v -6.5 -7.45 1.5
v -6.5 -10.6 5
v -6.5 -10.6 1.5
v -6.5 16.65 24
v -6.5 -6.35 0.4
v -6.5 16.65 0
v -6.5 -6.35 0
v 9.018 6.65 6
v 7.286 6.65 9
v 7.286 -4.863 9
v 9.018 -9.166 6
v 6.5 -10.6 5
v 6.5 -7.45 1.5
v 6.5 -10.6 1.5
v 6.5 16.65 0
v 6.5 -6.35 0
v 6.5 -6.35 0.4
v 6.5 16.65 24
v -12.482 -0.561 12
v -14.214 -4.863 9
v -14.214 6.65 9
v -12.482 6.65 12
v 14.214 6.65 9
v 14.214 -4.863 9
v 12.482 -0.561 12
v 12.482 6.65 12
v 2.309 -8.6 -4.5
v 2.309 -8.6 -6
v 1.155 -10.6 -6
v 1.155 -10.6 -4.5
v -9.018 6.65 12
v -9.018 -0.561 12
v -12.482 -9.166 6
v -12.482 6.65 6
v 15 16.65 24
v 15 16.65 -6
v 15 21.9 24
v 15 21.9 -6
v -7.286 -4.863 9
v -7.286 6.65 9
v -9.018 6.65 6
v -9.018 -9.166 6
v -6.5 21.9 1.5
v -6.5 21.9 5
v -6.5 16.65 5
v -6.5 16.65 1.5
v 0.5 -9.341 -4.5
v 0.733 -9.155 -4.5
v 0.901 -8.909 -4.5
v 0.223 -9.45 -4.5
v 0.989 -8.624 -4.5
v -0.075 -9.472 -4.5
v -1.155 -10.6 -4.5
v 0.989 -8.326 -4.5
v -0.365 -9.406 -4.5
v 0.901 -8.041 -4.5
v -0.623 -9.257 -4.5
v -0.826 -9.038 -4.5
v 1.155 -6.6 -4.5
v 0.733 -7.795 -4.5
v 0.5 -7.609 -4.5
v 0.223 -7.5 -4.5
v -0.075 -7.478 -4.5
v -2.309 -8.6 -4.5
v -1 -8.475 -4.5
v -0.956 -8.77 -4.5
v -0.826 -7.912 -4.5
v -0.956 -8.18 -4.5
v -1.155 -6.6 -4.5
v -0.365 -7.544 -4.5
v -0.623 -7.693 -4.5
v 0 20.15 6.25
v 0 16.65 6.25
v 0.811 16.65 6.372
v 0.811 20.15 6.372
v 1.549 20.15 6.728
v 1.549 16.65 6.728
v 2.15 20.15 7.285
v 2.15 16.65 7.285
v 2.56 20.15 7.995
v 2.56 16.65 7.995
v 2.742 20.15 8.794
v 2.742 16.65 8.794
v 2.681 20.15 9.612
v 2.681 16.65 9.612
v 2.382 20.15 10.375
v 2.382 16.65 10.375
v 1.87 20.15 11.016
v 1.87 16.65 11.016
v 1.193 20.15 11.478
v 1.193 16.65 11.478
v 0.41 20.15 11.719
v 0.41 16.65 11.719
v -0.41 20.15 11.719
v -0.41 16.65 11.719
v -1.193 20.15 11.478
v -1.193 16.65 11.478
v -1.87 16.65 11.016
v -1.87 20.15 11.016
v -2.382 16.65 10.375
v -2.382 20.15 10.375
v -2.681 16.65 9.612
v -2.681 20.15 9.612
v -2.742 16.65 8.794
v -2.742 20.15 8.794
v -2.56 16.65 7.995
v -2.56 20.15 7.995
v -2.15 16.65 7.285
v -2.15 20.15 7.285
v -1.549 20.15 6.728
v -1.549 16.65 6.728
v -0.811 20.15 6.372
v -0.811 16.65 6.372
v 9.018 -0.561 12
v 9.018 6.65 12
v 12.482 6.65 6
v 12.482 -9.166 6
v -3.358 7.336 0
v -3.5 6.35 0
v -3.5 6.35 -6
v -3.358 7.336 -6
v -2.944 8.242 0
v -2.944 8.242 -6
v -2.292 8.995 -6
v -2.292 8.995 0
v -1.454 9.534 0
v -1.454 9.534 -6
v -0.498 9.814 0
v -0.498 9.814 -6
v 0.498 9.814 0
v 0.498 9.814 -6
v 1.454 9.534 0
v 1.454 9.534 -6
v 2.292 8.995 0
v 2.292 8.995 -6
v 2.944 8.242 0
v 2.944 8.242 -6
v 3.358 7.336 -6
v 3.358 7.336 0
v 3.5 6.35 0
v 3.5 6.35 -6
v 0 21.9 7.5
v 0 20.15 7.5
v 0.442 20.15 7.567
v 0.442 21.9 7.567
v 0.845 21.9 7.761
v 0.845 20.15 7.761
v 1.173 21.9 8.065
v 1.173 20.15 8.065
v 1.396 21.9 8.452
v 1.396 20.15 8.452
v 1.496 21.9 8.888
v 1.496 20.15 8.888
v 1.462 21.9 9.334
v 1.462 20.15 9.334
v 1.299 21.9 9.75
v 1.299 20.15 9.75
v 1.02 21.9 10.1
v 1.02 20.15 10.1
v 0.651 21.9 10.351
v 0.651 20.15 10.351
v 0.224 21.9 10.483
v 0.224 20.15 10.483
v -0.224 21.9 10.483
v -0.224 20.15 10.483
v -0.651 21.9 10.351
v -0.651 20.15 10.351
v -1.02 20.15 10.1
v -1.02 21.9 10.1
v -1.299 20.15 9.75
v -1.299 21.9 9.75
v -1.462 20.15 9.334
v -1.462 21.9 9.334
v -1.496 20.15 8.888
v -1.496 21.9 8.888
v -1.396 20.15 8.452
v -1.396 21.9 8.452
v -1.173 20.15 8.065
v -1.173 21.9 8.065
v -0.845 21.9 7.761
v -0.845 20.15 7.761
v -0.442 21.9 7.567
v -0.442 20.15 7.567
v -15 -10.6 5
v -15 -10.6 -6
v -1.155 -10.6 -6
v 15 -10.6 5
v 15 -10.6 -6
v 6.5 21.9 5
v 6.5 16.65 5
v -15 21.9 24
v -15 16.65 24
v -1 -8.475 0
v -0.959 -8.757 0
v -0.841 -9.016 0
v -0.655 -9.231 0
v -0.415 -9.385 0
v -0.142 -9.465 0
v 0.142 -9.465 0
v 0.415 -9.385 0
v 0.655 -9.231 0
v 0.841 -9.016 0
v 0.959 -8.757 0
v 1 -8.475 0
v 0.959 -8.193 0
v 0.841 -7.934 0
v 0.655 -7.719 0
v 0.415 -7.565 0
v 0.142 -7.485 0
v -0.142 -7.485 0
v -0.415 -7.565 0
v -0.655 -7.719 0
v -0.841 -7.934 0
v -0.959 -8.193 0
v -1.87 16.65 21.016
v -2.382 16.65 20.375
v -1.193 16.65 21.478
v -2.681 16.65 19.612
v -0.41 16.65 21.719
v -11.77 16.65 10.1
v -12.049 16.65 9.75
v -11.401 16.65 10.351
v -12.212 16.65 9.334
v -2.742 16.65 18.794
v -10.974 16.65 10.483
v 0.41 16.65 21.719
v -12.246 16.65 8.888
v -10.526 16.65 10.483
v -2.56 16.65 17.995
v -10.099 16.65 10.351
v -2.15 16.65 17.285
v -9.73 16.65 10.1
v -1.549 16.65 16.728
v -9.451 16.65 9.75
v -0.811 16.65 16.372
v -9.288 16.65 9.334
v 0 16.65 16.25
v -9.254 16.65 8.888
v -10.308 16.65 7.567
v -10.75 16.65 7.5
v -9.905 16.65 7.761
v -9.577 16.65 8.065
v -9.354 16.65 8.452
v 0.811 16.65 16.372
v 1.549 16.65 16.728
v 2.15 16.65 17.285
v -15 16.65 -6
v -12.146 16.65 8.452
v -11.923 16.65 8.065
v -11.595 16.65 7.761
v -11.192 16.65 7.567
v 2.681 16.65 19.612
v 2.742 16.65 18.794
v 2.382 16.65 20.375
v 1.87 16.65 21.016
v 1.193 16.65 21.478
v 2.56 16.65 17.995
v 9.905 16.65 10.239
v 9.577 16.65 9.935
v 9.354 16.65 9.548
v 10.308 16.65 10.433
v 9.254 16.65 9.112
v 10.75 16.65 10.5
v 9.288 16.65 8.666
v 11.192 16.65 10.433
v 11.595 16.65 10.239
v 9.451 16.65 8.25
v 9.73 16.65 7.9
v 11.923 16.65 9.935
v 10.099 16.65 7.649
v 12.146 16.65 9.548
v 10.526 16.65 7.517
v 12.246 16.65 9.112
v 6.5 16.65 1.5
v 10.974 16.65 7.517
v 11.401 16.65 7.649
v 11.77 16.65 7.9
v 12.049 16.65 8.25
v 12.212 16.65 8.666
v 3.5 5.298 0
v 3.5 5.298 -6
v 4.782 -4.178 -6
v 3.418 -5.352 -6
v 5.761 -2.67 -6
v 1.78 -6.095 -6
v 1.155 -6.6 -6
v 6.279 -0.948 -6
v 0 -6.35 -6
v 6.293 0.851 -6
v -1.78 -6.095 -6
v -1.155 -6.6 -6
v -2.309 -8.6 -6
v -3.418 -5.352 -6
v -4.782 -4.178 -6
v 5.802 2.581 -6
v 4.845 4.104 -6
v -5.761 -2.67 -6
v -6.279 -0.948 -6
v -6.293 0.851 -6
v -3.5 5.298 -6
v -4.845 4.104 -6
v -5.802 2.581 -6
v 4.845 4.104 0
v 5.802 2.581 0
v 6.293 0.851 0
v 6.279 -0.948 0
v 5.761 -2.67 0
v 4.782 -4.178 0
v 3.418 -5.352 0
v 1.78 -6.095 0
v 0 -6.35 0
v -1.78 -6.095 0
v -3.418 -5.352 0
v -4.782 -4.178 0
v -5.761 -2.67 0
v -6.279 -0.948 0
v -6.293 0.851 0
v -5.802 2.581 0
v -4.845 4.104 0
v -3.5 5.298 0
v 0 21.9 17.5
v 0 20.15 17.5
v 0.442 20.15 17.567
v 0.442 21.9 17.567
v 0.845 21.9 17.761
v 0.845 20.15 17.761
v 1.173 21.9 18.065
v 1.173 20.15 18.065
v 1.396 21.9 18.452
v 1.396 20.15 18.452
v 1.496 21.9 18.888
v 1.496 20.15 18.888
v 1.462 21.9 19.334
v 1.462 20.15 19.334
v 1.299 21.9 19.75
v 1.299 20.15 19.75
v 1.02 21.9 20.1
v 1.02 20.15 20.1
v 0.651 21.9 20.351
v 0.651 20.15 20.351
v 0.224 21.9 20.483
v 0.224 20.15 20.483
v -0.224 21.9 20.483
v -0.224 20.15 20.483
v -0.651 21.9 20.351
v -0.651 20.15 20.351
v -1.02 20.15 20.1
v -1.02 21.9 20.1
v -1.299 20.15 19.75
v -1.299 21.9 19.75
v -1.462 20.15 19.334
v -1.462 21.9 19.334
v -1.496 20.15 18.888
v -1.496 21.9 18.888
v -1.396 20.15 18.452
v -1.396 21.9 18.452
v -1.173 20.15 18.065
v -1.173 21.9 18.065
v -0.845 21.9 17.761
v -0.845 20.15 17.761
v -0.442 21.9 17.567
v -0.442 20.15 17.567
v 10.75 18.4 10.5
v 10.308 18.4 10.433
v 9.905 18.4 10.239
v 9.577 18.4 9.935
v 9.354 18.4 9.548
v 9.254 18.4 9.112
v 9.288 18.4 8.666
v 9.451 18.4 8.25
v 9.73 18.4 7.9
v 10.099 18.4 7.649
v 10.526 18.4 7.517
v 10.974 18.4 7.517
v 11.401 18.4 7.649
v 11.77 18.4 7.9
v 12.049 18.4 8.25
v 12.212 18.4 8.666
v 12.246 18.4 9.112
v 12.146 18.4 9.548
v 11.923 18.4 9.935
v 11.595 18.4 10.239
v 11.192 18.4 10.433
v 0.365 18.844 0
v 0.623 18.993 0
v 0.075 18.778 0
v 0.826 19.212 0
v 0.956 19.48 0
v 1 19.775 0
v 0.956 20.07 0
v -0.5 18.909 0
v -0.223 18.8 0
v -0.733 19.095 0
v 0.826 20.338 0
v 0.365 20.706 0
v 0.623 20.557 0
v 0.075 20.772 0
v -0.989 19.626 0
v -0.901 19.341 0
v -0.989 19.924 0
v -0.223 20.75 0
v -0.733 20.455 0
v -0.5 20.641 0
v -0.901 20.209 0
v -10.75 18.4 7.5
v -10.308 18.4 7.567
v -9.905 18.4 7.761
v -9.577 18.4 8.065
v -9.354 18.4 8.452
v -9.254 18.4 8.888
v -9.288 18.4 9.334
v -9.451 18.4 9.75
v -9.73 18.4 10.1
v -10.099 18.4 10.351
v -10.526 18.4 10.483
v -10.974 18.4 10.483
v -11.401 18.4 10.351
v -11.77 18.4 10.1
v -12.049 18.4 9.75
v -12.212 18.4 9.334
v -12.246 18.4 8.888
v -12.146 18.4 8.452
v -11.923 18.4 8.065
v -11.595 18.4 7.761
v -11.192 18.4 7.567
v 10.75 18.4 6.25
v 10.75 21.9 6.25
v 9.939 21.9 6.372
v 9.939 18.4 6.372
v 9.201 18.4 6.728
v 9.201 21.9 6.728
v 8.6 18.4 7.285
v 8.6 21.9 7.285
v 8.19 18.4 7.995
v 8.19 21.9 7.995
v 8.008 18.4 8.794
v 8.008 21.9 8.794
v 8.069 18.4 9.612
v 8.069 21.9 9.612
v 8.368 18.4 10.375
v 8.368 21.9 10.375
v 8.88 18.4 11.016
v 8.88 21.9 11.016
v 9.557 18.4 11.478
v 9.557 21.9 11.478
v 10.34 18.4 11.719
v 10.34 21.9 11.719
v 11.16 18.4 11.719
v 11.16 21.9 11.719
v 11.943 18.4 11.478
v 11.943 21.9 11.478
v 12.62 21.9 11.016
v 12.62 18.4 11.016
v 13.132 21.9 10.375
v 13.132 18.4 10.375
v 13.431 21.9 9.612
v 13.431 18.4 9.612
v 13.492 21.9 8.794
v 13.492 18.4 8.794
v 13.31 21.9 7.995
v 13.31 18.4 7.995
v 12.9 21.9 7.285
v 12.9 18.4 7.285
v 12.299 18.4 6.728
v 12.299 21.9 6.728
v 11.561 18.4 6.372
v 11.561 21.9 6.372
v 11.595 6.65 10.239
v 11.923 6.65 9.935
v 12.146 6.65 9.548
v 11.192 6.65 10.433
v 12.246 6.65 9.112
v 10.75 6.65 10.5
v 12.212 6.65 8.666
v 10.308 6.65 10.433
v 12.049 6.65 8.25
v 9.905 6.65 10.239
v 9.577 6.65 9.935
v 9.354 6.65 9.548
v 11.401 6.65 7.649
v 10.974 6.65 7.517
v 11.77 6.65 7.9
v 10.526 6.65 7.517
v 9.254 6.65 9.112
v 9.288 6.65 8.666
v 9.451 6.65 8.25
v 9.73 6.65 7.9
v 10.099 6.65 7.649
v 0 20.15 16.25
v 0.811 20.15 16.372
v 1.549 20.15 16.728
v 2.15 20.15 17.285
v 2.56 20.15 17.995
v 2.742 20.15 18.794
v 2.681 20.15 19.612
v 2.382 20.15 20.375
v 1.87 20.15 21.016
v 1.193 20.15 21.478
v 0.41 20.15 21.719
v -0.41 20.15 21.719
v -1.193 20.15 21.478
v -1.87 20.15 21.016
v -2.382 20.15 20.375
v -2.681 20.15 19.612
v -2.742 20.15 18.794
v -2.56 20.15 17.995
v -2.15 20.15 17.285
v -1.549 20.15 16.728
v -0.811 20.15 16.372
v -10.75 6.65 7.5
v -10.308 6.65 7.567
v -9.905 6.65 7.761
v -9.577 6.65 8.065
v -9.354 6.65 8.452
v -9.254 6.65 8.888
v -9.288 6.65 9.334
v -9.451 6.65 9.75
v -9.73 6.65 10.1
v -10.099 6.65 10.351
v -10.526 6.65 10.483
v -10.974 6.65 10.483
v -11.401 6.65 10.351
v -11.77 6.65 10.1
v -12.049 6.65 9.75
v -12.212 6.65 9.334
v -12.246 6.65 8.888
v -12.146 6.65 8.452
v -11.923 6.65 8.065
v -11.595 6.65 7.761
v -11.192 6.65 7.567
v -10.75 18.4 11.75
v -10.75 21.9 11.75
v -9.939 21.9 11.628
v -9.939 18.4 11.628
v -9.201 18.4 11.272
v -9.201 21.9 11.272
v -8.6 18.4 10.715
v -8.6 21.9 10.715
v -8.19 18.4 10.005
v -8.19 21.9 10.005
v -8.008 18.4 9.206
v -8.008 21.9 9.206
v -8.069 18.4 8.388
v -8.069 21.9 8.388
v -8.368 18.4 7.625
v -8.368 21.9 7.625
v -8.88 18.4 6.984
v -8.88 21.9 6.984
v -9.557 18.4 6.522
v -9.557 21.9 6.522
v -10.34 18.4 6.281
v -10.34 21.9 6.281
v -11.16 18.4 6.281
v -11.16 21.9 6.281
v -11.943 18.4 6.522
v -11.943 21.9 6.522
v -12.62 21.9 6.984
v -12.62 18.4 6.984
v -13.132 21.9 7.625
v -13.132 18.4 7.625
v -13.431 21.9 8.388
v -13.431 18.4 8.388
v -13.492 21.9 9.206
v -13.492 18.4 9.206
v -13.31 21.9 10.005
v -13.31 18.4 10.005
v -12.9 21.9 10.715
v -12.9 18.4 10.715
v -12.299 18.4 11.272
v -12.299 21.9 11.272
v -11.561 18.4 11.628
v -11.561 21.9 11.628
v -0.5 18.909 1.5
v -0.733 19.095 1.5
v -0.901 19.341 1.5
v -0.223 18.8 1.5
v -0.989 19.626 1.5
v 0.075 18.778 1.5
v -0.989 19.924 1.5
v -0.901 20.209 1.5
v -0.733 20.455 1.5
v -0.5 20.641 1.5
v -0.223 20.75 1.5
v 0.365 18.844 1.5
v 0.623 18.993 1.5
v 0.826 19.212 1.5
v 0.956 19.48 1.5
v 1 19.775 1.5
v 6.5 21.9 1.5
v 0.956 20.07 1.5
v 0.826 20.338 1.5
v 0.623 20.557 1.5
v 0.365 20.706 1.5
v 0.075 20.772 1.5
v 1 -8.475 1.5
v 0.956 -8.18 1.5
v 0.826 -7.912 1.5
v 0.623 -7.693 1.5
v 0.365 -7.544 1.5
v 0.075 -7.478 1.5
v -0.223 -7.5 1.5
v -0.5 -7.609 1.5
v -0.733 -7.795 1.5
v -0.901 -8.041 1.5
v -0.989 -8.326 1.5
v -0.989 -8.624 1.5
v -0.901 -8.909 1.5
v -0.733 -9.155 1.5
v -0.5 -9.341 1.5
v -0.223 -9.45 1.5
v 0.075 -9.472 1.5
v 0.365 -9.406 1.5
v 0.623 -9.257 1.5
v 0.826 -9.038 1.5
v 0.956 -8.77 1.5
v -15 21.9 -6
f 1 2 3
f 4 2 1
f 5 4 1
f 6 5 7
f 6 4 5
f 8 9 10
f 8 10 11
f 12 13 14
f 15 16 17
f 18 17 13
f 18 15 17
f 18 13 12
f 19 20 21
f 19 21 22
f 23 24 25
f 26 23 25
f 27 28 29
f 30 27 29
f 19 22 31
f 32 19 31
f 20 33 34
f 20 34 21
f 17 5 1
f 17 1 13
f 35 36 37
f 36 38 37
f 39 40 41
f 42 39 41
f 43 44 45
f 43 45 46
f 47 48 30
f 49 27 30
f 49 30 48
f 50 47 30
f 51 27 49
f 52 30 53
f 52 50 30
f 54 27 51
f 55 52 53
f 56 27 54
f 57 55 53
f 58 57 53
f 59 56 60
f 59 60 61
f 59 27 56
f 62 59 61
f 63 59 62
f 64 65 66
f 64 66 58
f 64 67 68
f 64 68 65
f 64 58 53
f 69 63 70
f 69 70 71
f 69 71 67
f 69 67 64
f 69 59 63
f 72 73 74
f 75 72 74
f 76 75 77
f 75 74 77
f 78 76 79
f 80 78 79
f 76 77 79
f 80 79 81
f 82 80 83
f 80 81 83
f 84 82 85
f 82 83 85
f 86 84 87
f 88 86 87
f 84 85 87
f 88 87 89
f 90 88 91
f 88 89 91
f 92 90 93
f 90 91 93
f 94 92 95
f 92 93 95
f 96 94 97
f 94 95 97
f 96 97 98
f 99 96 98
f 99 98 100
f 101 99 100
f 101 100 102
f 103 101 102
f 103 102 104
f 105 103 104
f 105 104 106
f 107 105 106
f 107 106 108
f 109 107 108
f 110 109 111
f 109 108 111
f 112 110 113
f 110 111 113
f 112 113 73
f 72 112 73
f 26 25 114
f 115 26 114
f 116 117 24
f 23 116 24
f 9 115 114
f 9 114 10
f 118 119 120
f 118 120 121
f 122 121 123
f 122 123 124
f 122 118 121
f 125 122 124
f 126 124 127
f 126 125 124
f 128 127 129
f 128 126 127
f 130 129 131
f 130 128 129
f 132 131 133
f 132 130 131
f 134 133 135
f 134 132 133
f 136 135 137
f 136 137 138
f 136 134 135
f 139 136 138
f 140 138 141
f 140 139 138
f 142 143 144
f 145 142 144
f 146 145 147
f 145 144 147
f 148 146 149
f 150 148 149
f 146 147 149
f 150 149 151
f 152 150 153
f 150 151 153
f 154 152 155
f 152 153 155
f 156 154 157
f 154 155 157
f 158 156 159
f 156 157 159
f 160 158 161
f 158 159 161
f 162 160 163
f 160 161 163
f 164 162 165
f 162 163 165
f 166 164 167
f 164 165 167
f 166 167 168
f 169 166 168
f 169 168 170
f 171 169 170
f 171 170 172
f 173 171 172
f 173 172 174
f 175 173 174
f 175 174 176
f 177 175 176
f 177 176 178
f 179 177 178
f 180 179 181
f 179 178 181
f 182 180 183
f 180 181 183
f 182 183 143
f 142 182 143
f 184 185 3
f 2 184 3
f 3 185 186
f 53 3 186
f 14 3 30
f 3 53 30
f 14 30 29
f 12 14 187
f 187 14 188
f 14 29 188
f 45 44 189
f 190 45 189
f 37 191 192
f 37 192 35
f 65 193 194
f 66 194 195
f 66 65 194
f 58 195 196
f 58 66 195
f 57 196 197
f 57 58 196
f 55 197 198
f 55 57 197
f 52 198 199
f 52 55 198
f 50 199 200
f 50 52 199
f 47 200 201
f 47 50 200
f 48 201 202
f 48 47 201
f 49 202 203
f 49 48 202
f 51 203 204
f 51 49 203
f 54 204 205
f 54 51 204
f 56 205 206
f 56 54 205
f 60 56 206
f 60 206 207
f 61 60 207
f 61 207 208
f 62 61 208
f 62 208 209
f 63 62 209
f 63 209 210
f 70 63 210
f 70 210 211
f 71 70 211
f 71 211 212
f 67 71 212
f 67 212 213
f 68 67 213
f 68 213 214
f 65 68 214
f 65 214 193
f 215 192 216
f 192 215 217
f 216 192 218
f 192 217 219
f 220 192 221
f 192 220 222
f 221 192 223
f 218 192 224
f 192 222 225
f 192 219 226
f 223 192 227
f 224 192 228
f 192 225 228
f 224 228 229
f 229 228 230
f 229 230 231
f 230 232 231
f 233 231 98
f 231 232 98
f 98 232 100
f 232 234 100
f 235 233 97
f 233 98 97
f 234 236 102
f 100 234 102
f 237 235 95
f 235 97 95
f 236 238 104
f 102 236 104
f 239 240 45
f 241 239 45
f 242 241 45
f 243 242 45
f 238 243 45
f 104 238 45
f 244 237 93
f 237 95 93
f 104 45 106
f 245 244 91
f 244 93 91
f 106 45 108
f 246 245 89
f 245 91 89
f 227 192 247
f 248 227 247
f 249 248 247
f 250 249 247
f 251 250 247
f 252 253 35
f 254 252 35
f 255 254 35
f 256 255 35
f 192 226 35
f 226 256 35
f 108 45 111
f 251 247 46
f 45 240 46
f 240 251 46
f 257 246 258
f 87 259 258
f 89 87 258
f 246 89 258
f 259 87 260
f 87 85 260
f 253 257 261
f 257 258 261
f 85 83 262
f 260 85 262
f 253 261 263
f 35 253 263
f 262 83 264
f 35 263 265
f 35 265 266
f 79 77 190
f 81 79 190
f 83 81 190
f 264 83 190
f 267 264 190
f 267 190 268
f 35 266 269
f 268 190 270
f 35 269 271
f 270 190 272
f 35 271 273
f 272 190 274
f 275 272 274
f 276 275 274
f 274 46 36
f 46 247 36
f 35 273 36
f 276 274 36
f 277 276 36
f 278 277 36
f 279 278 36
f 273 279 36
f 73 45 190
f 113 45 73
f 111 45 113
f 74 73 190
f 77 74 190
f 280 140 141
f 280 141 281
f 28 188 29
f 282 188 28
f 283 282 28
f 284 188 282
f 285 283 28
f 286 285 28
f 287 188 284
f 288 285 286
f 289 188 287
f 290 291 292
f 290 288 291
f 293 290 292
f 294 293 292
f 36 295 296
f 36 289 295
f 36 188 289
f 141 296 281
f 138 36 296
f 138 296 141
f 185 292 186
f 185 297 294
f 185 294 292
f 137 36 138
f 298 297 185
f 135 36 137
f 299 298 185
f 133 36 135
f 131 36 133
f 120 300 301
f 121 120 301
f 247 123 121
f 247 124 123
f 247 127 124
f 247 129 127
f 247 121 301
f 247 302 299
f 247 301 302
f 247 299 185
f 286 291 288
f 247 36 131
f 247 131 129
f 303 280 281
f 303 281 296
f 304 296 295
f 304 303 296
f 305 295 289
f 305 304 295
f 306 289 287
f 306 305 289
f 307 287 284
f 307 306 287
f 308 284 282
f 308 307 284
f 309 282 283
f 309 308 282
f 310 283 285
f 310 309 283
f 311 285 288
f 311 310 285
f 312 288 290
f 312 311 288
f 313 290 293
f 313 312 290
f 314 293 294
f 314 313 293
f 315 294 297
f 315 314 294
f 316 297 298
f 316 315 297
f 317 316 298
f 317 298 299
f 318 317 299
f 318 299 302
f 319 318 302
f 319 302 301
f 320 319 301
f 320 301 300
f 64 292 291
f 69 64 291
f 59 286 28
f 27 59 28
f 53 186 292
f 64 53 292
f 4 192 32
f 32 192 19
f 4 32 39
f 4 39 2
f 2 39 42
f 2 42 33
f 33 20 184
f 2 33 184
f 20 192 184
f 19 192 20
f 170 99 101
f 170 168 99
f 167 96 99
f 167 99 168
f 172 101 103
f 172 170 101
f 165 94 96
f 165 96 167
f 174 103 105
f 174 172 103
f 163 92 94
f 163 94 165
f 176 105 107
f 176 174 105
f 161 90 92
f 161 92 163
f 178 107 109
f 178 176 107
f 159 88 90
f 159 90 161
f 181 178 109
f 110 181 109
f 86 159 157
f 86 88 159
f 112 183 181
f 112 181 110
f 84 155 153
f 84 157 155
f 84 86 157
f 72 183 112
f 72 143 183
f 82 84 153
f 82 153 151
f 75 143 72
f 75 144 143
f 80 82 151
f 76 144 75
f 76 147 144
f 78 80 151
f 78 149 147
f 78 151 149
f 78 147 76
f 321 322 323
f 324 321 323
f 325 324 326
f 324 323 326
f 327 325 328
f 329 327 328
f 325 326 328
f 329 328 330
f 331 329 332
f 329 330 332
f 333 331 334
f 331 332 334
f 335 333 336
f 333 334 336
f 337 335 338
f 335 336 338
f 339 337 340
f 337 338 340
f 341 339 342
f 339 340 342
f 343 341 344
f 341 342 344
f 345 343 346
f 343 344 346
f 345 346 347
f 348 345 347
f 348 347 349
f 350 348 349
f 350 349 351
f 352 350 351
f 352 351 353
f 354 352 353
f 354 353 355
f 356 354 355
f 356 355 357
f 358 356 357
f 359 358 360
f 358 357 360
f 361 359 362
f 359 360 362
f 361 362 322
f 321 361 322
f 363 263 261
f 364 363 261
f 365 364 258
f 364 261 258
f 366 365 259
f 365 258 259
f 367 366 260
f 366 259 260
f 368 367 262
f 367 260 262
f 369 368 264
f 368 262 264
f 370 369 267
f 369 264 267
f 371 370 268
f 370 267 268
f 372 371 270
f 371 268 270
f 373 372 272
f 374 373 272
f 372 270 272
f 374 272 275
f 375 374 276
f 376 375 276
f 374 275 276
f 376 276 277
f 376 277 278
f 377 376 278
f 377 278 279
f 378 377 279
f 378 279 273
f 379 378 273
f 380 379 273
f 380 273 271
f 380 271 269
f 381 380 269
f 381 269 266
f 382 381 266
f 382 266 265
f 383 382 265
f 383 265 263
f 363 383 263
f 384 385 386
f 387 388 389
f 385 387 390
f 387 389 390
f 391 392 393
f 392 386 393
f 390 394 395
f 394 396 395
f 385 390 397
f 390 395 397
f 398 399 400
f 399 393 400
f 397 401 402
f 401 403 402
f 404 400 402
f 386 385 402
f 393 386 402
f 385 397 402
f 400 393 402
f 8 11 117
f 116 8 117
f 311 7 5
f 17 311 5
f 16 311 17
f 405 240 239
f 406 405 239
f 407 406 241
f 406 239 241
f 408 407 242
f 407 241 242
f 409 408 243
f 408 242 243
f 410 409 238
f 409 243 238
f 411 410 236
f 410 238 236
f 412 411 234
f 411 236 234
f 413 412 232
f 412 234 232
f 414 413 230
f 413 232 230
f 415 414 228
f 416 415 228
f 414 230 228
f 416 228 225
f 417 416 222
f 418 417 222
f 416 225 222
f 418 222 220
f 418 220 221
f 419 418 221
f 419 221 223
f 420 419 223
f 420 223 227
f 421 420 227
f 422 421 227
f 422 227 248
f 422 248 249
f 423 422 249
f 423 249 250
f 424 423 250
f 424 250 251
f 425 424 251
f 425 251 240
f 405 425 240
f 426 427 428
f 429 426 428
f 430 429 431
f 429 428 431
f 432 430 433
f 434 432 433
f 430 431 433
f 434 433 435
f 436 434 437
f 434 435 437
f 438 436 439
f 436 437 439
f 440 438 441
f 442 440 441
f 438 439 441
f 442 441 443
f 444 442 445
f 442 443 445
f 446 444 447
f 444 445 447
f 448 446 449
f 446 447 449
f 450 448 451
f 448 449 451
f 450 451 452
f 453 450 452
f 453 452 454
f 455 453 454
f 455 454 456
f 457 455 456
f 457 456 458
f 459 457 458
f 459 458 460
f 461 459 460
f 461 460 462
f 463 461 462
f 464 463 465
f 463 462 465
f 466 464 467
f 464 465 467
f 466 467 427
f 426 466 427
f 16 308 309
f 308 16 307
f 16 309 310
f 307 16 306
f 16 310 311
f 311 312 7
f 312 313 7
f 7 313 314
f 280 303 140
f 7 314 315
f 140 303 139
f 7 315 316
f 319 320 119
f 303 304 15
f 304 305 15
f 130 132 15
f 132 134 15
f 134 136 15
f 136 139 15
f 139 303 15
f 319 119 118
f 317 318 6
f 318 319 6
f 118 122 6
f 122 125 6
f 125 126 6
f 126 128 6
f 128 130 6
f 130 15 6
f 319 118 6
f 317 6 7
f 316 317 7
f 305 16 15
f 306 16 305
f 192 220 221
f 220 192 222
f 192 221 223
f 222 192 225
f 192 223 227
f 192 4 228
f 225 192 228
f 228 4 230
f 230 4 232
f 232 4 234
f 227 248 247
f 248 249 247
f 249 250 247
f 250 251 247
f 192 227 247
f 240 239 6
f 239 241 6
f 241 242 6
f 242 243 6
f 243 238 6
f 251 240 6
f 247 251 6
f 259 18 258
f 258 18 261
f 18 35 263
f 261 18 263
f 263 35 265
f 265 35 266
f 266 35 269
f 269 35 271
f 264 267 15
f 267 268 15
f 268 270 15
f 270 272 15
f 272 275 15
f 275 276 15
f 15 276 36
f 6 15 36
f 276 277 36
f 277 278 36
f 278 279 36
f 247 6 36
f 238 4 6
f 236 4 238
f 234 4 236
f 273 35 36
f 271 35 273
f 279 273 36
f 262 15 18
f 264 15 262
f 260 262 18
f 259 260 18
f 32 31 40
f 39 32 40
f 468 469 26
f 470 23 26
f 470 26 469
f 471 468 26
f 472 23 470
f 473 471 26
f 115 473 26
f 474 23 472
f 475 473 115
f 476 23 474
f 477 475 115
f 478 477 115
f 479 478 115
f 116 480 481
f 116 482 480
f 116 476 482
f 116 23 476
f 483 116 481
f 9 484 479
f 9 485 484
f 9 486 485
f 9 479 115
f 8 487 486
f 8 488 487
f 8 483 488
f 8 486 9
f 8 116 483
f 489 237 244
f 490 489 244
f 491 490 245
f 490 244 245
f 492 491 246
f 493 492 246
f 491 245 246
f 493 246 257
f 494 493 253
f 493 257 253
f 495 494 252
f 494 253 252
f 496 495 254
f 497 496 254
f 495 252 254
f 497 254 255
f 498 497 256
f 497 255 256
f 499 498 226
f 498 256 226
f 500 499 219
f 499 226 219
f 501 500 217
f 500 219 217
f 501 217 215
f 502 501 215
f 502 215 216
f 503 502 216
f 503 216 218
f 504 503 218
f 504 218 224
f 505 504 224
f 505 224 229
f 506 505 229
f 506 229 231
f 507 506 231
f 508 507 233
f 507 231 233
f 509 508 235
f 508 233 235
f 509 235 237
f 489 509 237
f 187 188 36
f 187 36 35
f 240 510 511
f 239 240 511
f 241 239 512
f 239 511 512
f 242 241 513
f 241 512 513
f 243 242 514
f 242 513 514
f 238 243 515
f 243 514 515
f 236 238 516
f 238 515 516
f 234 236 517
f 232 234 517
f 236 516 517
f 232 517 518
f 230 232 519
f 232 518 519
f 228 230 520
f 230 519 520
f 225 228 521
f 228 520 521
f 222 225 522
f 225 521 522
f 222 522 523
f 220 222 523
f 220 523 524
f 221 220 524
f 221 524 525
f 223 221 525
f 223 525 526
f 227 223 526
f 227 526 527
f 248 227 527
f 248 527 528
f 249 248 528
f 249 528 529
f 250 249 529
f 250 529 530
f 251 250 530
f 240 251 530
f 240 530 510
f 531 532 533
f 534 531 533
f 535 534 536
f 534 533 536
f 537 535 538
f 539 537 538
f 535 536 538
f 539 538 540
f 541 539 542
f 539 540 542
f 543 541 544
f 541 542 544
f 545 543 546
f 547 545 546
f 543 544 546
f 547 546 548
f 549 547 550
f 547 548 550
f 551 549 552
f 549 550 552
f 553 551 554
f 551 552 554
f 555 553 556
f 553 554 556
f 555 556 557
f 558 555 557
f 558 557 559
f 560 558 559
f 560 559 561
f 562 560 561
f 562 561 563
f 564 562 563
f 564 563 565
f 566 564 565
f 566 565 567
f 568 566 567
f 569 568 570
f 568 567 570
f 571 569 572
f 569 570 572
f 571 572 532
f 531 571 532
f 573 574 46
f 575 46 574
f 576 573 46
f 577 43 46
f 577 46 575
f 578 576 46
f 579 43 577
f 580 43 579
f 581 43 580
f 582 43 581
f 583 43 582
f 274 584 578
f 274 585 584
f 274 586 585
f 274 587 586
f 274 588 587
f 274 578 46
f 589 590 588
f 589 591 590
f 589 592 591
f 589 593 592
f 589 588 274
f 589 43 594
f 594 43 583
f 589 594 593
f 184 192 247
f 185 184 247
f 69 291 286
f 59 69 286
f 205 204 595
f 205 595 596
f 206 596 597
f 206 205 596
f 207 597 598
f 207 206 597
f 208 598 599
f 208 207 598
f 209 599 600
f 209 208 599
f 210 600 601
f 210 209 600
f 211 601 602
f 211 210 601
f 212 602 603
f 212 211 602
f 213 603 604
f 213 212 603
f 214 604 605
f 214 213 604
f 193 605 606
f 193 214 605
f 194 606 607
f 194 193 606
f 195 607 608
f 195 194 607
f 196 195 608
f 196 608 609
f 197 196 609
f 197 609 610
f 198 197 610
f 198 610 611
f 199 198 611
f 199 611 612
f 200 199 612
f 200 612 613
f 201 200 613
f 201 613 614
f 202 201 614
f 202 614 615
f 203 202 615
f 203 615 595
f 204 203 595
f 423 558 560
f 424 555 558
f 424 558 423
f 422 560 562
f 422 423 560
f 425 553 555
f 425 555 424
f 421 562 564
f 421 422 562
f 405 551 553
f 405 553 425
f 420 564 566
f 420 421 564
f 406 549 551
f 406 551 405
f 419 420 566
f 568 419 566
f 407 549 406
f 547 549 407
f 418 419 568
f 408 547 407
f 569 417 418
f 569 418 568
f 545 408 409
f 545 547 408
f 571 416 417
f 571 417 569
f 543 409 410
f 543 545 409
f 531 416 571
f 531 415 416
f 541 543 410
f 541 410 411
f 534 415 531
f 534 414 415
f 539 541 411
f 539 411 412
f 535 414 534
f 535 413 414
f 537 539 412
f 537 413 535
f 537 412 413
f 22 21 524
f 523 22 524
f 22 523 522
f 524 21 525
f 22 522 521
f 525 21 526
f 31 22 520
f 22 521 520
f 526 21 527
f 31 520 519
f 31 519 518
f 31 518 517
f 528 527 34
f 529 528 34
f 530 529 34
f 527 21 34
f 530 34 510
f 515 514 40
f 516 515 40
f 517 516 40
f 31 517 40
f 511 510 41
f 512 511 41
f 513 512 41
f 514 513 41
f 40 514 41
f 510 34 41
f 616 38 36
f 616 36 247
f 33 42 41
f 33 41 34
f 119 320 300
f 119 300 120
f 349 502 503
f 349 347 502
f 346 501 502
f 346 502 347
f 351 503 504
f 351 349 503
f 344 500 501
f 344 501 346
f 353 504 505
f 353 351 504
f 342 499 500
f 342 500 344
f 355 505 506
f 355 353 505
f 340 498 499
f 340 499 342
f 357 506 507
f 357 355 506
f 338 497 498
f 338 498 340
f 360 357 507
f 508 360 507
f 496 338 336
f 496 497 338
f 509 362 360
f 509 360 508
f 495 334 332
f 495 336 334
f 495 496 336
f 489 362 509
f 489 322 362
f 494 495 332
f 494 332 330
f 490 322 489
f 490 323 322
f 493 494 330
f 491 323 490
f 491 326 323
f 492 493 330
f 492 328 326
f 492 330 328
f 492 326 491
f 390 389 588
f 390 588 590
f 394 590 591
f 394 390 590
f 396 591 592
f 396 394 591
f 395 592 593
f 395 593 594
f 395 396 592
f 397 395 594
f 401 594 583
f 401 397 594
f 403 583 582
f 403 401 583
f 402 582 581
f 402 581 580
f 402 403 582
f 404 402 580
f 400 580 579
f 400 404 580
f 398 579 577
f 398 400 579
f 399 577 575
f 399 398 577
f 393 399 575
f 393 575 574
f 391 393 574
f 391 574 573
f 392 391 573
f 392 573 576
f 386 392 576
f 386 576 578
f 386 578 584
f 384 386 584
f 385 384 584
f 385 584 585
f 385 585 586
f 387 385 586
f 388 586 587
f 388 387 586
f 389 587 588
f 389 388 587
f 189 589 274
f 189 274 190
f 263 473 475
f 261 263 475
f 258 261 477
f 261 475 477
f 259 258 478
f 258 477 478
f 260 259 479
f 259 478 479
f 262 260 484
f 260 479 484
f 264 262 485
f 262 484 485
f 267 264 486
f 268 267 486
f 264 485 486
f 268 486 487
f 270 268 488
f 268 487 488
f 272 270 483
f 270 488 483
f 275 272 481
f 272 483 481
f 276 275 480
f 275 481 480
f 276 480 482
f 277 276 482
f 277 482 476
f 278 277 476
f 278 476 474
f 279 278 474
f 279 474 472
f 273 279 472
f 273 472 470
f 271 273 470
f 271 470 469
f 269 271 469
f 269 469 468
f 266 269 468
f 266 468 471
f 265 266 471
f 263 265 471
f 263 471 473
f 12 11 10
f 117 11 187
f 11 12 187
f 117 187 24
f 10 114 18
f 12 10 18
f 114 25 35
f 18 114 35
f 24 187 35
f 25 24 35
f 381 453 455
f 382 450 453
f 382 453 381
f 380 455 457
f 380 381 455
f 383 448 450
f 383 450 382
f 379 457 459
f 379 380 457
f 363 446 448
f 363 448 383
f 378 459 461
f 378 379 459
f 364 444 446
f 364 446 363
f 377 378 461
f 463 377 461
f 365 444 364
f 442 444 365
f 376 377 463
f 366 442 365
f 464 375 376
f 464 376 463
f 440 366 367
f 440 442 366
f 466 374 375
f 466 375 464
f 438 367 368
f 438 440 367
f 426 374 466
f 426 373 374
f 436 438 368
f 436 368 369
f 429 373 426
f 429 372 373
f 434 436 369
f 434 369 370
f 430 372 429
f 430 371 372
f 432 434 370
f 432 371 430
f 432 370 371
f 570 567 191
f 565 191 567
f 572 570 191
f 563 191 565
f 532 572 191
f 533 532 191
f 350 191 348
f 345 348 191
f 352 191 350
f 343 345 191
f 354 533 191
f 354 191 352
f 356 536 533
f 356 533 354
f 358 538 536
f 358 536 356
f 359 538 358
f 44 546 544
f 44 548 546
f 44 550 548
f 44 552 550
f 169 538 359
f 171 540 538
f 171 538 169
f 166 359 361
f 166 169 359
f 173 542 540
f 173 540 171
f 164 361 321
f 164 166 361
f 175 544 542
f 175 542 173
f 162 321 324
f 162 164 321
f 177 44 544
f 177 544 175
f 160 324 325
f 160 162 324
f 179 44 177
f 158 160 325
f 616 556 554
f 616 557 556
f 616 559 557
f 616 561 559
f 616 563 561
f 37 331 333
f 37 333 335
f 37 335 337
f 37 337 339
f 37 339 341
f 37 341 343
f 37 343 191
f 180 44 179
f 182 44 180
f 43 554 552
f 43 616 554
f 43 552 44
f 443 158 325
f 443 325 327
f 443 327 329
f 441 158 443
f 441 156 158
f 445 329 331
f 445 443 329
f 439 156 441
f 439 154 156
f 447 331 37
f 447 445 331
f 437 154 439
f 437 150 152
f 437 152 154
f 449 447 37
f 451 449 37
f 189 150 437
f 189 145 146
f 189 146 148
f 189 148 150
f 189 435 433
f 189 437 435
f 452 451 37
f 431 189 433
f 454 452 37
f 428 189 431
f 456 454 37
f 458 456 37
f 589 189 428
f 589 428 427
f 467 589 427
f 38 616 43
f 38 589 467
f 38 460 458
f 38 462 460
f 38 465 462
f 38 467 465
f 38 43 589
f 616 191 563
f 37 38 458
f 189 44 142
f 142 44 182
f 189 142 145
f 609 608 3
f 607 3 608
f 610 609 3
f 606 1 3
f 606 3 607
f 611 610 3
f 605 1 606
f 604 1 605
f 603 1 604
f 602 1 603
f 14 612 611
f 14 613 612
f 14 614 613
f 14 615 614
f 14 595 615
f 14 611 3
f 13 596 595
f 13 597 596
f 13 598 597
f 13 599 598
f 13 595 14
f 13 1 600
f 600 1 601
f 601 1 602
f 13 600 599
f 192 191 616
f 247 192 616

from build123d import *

# Parameters (mm, degrees)
SKETCH1_W           = 30
SKETCH1_H           = 32.5
SKETCH1_R           = 1
SKETCH1_W_2         = 13
SKETCH1_H_2         = 23
BOSS_EXTRUDE3_DEPTH = 1.5
SKETCH6_W           = 30
SKETCH6_H           = 32.5
BOSS_EXTRUDE4_DEPTH = 6
CUT_EXTRUDE1_DEPTH  = 6
SKETCH7_W           = 8.5
SKETCH7_H           = 32.5
BOSS_EXTRUDE5_DEPTH = 3.5
SKETCH8_W           = 30
SKETCH8_H           = 5.25
BOSS_EXTRUDE6_DEPTH = 19
BOSS_EXTRUDE7_DEPTH = 8.5
BOSS_EXTRUDE8_DEPTH = 8.5
CUT_EXTRUDE2_DEPTH  = 1.5
CUT_EXTRUDE3_START  = -4.5
SKETCH14_R          = 1
CUT_EXTRUDE3_DEPTH  = 4.5
CHAMFER2_SIZE       = 1.1
SKETCH15_R          = 2.75
CUT_EXTRUDE4_DEPTH  = 3.5
SKETCH16_R          = 1.5
CUT_EXTRUDE5_DEPTH  = 1.75
CUT_EXTRUDE6_REACH  = 35.145
SKETCH20_R          = 1.5
CUT_EXTRUDE7_DEPTH  = 15.25
SKETCH21_R          = 2.75
CUT_EXTRUDE8_DEPTH  = 3.5


with BuildPart() as part:
    # Sketch1 → Boss-Extrude3 (new body)
    with BuildSketch(Plane.XY):
        with Locations((0, 5.65)):
            Rectangle(SKETCH1_W, SKETCH1_H)
        with Locations((0, -8.475)):
            Circle(SKETCH1_R, mode=Mode.SUBTRACT)
        with Locations((0, 19.775)):
            Circle(SKETCH1_R, mode=Mode.SUBTRACT)
        with Locations((0, 5.15)):
            Rectangle(SKETCH1_W_2, SKETCH1_H_2, mode=Mode.SUBTRACT)
    extrude(amount=BOSS_EXTRUDE3_DEPTH)

    # Sketch6 → Boss-Extrude4 (add)
    with BuildSketch(Plane(origin=(0, 0, 0), x_dir=(-1, 0, 0), z_dir=(0, 0, -1))):
        with Locations((0, 5.65)):
            Rectangle(SKETCH6_W, SKETCH6_H)
    extrude(amount=BOSS_EXTRUDE4_DEPTH)

    # Sketch1<3> → Cut-Extrude1 (cut)
    with BuildSketch(Plane.XY):
        with BuildLine():
            Line((3.5, 6.35), (3.5, 5.298348799))
            ThreePointArc((3.5, 5.298348799), (0, -6.35), (-3.5, 5.298348799))
            Line((-3.5, 5.298348799), (-3.5, 6.35))
            ThreePointArc((-3.5, 6.35), (0, 9.85), (3.5, 6.35))
        make_face()
    extrude(amount=-CUT_EXTRUDE1_DEPTH, mode=Mode.SUBTRACT)

    # Sketch7 → Boss-Extrude5 (add)
    with BuildSketch(Plane.XY.offset(1.5)):
        with Locations((-10.75, 5.65)):
            Rectangle(SKETCH7_W, SKETCH7_H)
        with Locations((10.75, 5.65)):
            Rectangle(SKETCH7_W, SKETCH7_H)
    extrude(amount=BOSS_EXTRUDE5_DEPTH)

    # Sketch8 → Boss-Extrude6 (add)
    with BuildSketch(Plane.XY.offset(5)):
        with Locations((0, 19.275)):
            Rectangle(SKETCH8_W, SKETCH8_H)
    extrude(amount=BOSS_EXTRUDE6_DEPTH)

    # Sketch9 → Boss-Extrude7 (add)
    with BuildSketch(Plane(origin=(15, 0, 0), x_dir=(0, 0, -1), z_dir=(1, 0, 0))):
        Polygon((-24, 16.65), (-5, 16.65), (-5, -10.6), align=None)
    extrude(amount=-BOSS_EXTRUDE7_DEPTH)

    # Sketch10 → Boss-Extrude8 (add)
    with BuildSketch(Plane.ZY.offset(15)):
        Polygon((24, 16.65), (5, -10.6), (5, 16.65), align=None)
    extrude(amount=-BOSS_EXTRUDE8_DEPTH)

    # Sketch12 → Cut-Extrude2 (cut)
    with BuildSketch(Plane(origin=(0, 0, -6), x_dir=(-1, 0, 0), z_dir=(0, 0, -1))):
        Polygon((2.309401077, -8.6), (1.154700538, -6.6), (-1.154700538, -6.6), (-2.309401077, -8.6), (-1.154700538, -10.6), (1.154700538, -10.6), align=None)
    extrude(amount=-CUT_EXTRUDE2_DEPTH, mode=Mode.SUBTRACT)

    # Sketch14 → Cut-Extrude3 (cut)
    with BuildSketch(Plane.XY.offset(CUT_EXTRUDE3_START)):
        with Locations(Location((0, -8.475, 0), (0, 0, 180))):
            Circle(SKETCH14_R)
    extrude(amount=CUT_EXTRUDE3_DEPTH, mode=Mode.SUBTRACT)

    # Chamfer2
    chamfer2_edges = [part.edges().sort_by_distance(p)[0] for p in [
        (0, -6.35, 1.5),
    ]]
    chamfer(chamfer2_edges, length=CHAMFER2_SIZE)

    # Sketch15 → Cut-Extrude4 (cut)
    with BuildSketch(Plane.XZ.offset(-16.65)):
        with Locations(Location((0, 19, 0), (0, 0, 270))):
            Circle(SKETCH15_R)
        with Locations(Location((0, 9, 0), (0, 0, 270))):
            Circle(SKETCH15_R)
    extrude(amount=-CUT_EXTRUDE4_DEPTH, mode=Mode.SUBTRACT)

    # Sketch16 → Cut-Extrude5 (cut)
    with BuildSketch(Plane.XZ.offset(-20.15)):
        with Locations(Location((0, 19, 0), (0, 0, 270))):
            Circle(SKETCH16_R)
        with Locations(Location((0, 9, 0), (0, 0, 270))):
            Circle(SKETCH16_R)
    extrude(amount=-CUT_EXTRUDE5_DEPTH, mode=Mode.SUBTRACT)

    # Cut-Extrude6: up to this plane
    cut_extrude6_end = Plane(origin=(-26.719911198, -10.6, 5), z_dir=(0, -0.5719461405775754, 0.8202911753020488))
    # Sketch19 → Cut-Extrude6 (cut, up to the surface)
    with BuildSketch(Plane(origin=(0, 6.65, 0), x_dir=(-1, 0, 0), z_dir=(0, -1, 0)), mode=Mode.PRIVATE) as cut_extrude6_sk1:
        Polygon((9.017949192, -12), (7.285898385, -9), (9.017949192, -6), (12.482050808, -6), (14.214101615, -9), (12.482050808, -12), align=None)
    cut_extrude6_tool1 = split(extrude(cut_extrude6_sk1.sketch, amount=CUT_EXTRUDE6_REACH, mode=Mode.PRIVATE), bisect_by=cut_extrude6_end, keep=Keep.BOTH, mode=Mode.PRIVATE)
    add(cut_extrude6_tool1.solids().sort_by_distance((-10.75, 6.65, 9))[0], mode=Mode.SUBTRACT)
    # Sketch19 → Cut-Extrude6 (cut, up to the surface)
    with BuildSketch(Plane(origin=(0, 6.65, 0), x_dir=(-1, 0, 0), z_dir=(0, -1, 0)), mode=Mode.PRIVATE) as cut_extrude6_sk2:
        Polygon((-7.285898385, -9), (-9.017949192, -6), (-12.482050808, -6), (-14.214101615, -9), (-12.482050808, -12), (-9.017949192, -12), align=None)
    cut_extrude6_tool2 = split(extrude(cut_extrude6_sk2.sketch, amount=CUT_EXTRUDE6_REACH, mode=Mode.PRIVATE), bisect_by=cut_extrude6_end, keep=Keep.BOTH, mode=Mode.PRIVATE)
    add(cut_extrude6_tool2.solids().sort_by_distance((10.75, 6.65, 9))[0], mode=Mode.SUBTRACT)

    # Sketch20 → Cut-Extrude7 (cut)
    with BuildSketch(Plane.XZ.offset(-6.65)):
        with Locations(Location((-10.75, 9, 0), (0, 0, 270))):
            Circle(SKETCH20_R)
        with Locations(Location((10.75, 9, 0), (0, 0, 90))):
            Circle(SKETCH20_R)
    extrude(amount=-CUT_EXTRUDE7_DEPTH, mode=Mode.SUBTRACT)

    # Sketch21 → Cut-Extrude8 (cut)
    with BuildSketch(Plane(origin=(0, 21.9, 0), x_dir=(1, 0, 0), z_dir=(0, 1, 0))):
        with Locations(Location((-10.75, -9, 0), (0, 0, 270))):
            Circle(SKETCH21_R)
        with Locations(Location((10.75, -9, 0), (0, 0, 90))):
            Circle(SKETCH21_R)
    extrude(amount=-CUT_EXTRUDE8_DEPTH, mode=Mode.SUBTRACT)


with BuildPart() as body_2:
    # Split1: the piece on the far side of the plane
    add(part.part)
    split(bisect_by=Plane(origin=(0, 16.65, 0), x_dir=(0, 0, -1), z_dir=(0, -1, 0)), keep=Keep.BOTTOM)


with BuildPart() as part_1:
    add(part.part)

    # Split1
    split(bisect_by=Plane(origin=(0, 16.65, 0), x_dir=(0, 0, -1), z_dir=(0, -1, 0)), keep=Keep.TOP)


solid = Compound([body_2.part, part_1.part])
